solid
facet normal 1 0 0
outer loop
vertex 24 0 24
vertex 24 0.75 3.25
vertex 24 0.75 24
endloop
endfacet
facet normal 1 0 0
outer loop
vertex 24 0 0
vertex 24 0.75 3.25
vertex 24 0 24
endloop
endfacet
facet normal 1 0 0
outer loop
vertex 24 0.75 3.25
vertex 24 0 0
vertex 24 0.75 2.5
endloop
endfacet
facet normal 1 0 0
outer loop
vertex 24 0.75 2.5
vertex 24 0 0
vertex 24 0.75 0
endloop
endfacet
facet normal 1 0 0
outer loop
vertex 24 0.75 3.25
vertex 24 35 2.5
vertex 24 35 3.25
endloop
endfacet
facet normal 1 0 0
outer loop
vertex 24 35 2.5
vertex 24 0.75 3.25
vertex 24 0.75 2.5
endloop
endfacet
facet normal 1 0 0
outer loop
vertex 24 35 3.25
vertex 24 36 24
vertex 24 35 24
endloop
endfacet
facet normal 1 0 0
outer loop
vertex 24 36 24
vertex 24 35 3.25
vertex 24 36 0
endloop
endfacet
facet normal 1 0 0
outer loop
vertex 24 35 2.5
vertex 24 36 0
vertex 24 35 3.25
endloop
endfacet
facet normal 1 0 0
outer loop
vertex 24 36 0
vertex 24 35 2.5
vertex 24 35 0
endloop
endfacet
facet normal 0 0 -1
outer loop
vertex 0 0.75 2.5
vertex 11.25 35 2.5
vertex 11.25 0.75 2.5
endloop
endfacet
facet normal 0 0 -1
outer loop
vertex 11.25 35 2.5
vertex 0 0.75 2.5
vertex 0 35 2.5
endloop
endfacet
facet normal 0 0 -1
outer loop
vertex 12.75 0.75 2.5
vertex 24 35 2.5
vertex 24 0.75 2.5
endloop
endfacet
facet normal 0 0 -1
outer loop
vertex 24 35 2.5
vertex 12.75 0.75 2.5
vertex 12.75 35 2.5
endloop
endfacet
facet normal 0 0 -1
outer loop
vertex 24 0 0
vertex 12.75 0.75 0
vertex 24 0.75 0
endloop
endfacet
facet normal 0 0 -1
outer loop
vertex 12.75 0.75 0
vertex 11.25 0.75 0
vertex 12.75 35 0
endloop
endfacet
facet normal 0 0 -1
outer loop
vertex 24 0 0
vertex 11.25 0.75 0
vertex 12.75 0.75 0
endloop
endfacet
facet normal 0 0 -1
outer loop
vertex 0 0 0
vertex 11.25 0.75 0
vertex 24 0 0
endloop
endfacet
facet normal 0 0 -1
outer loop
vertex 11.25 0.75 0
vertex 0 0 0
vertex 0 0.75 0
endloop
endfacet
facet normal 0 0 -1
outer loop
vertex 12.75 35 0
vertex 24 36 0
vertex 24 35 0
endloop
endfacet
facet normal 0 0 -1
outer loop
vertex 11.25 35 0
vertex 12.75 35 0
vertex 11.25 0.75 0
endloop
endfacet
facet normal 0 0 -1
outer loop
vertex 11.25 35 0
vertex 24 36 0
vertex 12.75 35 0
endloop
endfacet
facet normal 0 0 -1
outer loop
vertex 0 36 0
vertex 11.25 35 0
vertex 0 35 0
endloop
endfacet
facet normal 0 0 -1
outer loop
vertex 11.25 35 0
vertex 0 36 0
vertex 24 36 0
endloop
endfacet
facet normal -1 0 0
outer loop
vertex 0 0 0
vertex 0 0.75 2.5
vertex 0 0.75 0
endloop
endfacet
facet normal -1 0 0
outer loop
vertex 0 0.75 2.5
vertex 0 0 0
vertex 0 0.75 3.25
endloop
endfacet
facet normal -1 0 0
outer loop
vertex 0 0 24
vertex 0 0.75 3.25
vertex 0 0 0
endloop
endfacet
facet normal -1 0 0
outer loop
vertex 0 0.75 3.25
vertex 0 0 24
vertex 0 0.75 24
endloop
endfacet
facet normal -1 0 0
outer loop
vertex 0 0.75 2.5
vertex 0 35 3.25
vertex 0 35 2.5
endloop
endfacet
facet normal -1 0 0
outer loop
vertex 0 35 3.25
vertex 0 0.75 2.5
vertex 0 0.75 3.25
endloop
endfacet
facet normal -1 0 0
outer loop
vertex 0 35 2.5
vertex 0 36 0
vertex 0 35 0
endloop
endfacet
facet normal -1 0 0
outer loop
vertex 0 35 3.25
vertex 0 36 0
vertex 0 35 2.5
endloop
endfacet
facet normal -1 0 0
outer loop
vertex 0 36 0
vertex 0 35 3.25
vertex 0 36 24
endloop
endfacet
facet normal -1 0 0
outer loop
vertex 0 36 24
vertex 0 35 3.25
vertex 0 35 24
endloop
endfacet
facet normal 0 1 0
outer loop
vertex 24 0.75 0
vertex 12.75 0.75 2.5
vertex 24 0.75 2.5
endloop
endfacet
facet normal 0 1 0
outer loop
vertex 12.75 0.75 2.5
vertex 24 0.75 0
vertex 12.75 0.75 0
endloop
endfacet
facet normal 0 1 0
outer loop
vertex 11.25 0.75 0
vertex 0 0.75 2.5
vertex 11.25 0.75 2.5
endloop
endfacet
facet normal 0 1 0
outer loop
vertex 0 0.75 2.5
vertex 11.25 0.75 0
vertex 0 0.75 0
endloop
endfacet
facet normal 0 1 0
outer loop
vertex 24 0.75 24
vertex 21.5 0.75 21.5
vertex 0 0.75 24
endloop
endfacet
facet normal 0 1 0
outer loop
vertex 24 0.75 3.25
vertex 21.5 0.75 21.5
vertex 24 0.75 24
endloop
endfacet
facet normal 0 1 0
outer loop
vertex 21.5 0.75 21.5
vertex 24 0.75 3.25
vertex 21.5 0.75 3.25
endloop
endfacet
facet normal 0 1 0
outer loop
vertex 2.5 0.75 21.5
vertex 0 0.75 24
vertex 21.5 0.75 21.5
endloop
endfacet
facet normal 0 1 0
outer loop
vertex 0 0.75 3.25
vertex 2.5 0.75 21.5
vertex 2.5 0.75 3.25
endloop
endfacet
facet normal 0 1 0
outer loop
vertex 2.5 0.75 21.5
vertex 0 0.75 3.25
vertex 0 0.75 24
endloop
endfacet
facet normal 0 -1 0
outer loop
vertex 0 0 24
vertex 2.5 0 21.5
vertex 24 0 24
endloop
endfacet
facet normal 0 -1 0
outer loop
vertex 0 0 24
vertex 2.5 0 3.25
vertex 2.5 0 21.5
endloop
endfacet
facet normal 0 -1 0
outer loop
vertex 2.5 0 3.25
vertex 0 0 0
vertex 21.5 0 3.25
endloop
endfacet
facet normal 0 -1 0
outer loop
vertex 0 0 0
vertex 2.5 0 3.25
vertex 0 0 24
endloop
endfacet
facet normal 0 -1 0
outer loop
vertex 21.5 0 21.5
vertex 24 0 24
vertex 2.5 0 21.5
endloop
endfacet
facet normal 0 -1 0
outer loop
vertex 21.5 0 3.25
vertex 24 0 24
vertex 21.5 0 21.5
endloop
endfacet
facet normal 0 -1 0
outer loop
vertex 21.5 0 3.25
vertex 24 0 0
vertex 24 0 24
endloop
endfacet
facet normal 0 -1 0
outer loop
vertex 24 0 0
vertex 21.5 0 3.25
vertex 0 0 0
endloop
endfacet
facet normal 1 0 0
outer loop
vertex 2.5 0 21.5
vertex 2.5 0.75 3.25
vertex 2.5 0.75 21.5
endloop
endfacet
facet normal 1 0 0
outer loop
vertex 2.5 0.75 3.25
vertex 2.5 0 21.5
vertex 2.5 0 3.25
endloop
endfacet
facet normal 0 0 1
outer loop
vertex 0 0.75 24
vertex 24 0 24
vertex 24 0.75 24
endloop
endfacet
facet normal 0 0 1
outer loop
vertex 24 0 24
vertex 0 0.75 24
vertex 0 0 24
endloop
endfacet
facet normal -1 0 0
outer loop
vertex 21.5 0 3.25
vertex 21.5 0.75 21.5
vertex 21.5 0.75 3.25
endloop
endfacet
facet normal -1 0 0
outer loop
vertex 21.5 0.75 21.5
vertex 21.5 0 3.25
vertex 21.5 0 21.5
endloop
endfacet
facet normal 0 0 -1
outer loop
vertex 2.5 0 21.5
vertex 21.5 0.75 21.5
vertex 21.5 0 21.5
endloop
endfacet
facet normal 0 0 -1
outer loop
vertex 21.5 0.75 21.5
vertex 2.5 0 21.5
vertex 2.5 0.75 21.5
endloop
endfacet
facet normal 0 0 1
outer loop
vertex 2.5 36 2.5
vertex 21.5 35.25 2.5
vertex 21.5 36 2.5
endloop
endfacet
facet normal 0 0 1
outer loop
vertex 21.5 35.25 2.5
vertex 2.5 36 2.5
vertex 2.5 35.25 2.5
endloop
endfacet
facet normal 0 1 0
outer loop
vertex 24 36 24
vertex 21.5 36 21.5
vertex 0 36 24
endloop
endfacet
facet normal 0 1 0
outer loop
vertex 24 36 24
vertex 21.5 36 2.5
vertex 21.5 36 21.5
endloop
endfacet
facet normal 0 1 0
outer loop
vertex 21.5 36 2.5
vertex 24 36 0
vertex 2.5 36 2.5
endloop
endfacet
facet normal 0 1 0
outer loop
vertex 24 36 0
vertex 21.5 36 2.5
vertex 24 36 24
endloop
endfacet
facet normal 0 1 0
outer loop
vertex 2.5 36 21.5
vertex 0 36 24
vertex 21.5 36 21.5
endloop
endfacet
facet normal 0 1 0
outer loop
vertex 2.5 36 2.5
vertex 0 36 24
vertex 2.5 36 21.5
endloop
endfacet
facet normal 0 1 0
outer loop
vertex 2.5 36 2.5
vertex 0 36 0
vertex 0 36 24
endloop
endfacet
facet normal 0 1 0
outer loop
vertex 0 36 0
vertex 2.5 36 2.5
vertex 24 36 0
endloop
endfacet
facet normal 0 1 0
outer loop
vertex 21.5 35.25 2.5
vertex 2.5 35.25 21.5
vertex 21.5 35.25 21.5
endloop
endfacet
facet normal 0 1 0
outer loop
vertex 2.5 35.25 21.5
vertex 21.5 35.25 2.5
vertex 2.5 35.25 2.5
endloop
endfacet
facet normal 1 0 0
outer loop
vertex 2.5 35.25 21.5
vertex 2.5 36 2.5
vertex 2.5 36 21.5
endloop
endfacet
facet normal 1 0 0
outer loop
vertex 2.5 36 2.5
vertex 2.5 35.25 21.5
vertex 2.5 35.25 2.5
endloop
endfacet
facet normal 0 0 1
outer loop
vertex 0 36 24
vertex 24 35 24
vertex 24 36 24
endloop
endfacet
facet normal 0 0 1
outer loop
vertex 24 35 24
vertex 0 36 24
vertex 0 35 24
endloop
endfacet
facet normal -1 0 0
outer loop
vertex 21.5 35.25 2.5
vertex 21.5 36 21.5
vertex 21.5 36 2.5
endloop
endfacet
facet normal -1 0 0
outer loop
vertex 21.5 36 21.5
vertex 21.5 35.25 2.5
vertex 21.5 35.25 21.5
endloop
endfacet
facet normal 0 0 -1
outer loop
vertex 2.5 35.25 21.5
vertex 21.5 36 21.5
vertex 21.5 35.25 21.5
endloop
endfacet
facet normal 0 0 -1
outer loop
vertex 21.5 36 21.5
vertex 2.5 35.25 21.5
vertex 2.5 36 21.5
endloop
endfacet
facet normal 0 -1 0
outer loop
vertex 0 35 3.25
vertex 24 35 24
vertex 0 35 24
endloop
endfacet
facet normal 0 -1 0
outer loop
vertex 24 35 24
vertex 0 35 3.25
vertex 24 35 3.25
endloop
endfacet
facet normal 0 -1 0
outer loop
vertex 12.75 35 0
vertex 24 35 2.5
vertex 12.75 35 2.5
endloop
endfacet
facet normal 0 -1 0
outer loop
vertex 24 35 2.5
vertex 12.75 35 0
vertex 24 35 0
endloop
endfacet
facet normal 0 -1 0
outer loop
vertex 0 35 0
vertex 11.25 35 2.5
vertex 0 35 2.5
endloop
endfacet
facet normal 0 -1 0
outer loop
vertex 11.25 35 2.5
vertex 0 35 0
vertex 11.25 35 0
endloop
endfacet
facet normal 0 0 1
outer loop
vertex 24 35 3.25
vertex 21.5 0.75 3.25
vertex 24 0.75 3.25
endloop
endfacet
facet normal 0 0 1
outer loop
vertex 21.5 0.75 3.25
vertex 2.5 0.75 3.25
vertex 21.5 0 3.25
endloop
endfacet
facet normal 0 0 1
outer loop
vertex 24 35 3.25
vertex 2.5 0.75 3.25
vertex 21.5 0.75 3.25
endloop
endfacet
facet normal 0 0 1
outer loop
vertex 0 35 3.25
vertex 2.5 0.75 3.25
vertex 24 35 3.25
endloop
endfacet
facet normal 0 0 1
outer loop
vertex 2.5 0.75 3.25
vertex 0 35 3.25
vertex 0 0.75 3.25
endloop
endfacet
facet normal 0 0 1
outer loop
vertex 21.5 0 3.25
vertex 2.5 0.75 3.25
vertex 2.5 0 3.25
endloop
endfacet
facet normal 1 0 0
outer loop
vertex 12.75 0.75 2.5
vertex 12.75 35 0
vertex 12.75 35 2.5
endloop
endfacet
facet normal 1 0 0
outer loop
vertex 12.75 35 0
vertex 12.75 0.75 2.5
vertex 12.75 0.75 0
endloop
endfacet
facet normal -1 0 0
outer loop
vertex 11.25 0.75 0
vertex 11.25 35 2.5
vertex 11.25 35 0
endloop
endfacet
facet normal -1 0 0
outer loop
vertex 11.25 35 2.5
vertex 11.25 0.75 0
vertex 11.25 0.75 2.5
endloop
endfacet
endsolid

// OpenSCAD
//Josiah's Kennel/Side Table

width = 24;
height = 24;
depth = 36;
thickness = 0.75;

boardWidth = 2.5;

module back(){
    
    translate([0, depth - thickness, 0])
    cube([width, thickness, boardWidth]);
    translate([0, depth - thickness, 0])
    cube([boardWidth, thickness, height]);
    translate([width - boardWidth, depth - thickness, 0])
    cube([boardWidth, thickness, height]);
    translate([0, depth - thickness, height - boardWidth])
    cube([width, thickness, boardWidth]);
    //backplate
    translate([0, depth - thickness - 0.25, 0])
    cube([width, 0.25, height]);
    
}

module front(){
    
    translate([0, 0, 0])
    cube([width, thickness, boardWidth]);
    translate([0, 0, 0])
    cube([boardWidth, thickness, height]);
    translate([width - boardWidth, 0, 0])
    cube([boardWidth, thickness, height]);
    translate([0, 0, height - boardWidth])
    cube([width, thickness, boardWidth]);
    
}

module base(){
    
    //floor
    translate([0, 0, boardWidth])
    cube([width, depth - thickness - 0.25, thickness]);
    //support
    translate([width/2 - 0.75, thickness, 0])
    cube([1.5, depth - thickness*2 - 0.25, boardWidth]);
    translate([width/2 - 0.75, thickness, 0])
    cube([1.5, depth - thickness*2 - 0.25, boardWidth]);
}

module frame(){
    
    front();
    back();
    base();
    
}











module main(){
    
    frame();
    
}main();
